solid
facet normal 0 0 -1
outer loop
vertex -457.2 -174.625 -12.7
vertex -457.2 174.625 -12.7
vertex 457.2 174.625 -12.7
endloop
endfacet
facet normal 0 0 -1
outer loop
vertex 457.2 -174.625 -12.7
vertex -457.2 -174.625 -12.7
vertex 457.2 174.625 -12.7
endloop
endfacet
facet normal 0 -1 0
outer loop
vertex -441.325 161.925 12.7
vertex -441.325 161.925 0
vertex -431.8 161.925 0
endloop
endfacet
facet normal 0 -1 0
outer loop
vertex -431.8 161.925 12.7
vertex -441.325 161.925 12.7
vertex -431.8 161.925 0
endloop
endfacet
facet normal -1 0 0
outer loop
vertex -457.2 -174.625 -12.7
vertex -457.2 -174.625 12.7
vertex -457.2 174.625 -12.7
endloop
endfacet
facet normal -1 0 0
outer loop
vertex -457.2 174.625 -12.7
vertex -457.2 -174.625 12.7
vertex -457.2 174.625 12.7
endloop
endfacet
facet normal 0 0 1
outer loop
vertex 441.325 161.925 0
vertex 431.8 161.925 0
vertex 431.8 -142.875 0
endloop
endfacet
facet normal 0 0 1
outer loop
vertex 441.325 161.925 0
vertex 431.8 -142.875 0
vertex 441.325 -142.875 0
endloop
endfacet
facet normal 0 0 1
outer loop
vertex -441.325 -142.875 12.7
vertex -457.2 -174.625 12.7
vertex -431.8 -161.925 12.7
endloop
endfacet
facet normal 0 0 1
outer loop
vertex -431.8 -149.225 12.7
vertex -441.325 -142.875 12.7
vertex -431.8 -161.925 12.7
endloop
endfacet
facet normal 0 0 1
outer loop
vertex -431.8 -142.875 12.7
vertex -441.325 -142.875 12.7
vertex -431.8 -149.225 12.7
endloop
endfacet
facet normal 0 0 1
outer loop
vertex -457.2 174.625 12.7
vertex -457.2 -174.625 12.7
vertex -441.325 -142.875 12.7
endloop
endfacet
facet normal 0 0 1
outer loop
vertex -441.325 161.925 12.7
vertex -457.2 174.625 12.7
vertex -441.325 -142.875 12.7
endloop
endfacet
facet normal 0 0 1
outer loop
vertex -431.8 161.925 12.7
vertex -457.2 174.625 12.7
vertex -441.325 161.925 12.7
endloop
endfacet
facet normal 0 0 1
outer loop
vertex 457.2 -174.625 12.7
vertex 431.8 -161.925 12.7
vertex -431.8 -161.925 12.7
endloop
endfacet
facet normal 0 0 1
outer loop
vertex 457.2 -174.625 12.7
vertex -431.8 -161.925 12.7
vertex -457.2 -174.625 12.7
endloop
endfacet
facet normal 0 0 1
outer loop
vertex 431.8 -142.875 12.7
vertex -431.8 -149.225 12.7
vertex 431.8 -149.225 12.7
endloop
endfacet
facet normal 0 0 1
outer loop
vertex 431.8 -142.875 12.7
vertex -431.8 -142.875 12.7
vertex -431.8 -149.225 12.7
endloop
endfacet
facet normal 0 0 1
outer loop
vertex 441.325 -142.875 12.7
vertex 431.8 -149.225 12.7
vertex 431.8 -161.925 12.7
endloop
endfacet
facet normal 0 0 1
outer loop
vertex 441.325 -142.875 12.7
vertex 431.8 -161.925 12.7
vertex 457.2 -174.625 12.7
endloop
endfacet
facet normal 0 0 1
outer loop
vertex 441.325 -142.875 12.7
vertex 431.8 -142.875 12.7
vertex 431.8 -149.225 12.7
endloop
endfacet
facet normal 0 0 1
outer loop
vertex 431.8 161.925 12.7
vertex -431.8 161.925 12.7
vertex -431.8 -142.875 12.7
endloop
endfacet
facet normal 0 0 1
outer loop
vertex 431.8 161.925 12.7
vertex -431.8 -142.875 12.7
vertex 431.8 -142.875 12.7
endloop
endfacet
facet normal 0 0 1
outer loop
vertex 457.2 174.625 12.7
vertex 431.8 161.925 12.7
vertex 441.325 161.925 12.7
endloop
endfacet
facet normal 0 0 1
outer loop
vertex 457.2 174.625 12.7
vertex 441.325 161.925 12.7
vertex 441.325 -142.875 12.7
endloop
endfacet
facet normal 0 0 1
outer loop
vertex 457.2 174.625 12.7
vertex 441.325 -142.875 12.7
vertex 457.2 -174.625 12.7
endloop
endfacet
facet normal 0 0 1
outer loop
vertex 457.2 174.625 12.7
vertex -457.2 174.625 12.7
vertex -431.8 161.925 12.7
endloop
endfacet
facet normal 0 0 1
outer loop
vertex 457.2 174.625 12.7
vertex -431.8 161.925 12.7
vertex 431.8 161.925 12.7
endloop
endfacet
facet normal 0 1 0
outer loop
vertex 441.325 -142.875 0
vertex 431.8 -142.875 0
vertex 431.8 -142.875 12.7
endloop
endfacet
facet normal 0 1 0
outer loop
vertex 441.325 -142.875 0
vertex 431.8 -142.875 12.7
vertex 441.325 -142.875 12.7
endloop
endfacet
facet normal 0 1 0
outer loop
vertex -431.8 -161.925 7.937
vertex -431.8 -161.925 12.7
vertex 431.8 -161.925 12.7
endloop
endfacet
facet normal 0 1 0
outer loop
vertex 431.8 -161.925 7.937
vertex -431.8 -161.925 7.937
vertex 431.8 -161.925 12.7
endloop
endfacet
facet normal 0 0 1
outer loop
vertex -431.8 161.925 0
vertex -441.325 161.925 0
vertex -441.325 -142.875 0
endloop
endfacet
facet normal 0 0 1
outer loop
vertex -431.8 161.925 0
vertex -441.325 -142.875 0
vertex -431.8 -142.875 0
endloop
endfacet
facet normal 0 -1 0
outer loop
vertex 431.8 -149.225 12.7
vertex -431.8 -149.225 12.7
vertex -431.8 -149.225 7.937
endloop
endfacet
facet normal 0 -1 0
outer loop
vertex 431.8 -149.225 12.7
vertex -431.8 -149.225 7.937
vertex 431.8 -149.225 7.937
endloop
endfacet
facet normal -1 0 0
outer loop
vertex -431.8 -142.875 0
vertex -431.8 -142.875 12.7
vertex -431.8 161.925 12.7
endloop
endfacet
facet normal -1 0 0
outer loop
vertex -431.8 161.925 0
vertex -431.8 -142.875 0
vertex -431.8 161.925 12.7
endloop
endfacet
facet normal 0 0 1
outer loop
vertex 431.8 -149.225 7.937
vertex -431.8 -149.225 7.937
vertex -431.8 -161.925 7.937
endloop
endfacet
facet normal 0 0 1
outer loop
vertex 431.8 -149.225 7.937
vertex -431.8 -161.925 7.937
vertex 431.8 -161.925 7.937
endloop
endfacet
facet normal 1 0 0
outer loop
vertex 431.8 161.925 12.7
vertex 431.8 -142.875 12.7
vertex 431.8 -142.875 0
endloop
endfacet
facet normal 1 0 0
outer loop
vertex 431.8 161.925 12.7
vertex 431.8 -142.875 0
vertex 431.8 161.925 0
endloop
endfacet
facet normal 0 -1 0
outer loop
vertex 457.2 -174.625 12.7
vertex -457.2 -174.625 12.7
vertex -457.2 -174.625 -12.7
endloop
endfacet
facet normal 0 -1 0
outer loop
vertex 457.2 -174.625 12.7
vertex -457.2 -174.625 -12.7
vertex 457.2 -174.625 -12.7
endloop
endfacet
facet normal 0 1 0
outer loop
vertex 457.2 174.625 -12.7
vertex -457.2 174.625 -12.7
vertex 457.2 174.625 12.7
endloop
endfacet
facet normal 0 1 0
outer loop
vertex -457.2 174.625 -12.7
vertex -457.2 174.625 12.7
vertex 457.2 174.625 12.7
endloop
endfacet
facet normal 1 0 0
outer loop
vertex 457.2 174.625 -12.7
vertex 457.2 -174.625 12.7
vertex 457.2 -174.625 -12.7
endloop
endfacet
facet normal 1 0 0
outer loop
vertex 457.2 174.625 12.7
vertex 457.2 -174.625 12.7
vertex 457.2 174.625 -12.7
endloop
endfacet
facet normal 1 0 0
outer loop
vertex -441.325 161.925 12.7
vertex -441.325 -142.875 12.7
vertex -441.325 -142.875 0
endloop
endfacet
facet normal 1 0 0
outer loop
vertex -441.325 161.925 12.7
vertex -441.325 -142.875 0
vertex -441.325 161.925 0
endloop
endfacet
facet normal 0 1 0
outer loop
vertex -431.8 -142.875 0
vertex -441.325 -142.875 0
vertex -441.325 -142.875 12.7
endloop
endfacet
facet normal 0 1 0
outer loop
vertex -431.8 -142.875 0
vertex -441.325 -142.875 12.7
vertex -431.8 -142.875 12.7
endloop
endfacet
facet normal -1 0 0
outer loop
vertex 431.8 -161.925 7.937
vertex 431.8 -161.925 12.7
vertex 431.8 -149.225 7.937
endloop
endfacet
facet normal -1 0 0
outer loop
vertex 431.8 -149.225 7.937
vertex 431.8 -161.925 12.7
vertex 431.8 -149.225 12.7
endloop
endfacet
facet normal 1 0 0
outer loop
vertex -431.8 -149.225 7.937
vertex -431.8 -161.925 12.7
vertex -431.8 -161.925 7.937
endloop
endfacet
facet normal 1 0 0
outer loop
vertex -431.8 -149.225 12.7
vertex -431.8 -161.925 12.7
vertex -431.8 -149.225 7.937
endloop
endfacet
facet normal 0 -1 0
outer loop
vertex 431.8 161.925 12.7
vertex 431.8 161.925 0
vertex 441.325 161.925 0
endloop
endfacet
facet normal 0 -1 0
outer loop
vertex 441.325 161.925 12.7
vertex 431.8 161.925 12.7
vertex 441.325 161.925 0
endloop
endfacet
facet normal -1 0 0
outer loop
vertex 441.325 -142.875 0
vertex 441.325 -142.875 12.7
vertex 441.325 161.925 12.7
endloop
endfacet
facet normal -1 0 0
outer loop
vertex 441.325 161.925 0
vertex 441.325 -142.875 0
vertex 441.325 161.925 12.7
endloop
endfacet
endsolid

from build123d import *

# Parameters (mm, degrees)
F0_W     = 914.4
F0_H     = 349.25
F1_DEPTH = 12.7
F2_W     = 863.6
F2_H     = 12.7
F3_DEPTH = 4.7625
F4_W     = 9.525
F4_H     = 304.8
F5_DEPTH = 12.7


with BuildPart() as f1:
    # F0 (on Top) → F1 (new body, symmetric)
    with BuildSketch(Plane.XY):
        Rectangle(F0_W, F0_H)
    extrude(amount=F1_DEPTH, both=True)

    # F2 (on face) → F3 (cut)
    with BuildSketch(Plane.XY.offset(12.7)):
        with Locations((0, -155.575)):
            Rectangle(F2_W, F2_H)
    extrude(amount=-F3_DEPTH, mode=Mode.SUBTRACT)

    # F4 (on face) → F5 (cut)
    with BuildSketch(Plane.XY.offset(12.7)):
        with Locations((-436.5625, 9.525)):
            Rectangle(F4_W, F4_H)
        with Locations((436.5625, 9.525)):
            Rectangle(F4_W, F4_H)
    extrude(amount=-F5_DEPTH, mode=Mode.SUBTRACT)


solid = f1.part
